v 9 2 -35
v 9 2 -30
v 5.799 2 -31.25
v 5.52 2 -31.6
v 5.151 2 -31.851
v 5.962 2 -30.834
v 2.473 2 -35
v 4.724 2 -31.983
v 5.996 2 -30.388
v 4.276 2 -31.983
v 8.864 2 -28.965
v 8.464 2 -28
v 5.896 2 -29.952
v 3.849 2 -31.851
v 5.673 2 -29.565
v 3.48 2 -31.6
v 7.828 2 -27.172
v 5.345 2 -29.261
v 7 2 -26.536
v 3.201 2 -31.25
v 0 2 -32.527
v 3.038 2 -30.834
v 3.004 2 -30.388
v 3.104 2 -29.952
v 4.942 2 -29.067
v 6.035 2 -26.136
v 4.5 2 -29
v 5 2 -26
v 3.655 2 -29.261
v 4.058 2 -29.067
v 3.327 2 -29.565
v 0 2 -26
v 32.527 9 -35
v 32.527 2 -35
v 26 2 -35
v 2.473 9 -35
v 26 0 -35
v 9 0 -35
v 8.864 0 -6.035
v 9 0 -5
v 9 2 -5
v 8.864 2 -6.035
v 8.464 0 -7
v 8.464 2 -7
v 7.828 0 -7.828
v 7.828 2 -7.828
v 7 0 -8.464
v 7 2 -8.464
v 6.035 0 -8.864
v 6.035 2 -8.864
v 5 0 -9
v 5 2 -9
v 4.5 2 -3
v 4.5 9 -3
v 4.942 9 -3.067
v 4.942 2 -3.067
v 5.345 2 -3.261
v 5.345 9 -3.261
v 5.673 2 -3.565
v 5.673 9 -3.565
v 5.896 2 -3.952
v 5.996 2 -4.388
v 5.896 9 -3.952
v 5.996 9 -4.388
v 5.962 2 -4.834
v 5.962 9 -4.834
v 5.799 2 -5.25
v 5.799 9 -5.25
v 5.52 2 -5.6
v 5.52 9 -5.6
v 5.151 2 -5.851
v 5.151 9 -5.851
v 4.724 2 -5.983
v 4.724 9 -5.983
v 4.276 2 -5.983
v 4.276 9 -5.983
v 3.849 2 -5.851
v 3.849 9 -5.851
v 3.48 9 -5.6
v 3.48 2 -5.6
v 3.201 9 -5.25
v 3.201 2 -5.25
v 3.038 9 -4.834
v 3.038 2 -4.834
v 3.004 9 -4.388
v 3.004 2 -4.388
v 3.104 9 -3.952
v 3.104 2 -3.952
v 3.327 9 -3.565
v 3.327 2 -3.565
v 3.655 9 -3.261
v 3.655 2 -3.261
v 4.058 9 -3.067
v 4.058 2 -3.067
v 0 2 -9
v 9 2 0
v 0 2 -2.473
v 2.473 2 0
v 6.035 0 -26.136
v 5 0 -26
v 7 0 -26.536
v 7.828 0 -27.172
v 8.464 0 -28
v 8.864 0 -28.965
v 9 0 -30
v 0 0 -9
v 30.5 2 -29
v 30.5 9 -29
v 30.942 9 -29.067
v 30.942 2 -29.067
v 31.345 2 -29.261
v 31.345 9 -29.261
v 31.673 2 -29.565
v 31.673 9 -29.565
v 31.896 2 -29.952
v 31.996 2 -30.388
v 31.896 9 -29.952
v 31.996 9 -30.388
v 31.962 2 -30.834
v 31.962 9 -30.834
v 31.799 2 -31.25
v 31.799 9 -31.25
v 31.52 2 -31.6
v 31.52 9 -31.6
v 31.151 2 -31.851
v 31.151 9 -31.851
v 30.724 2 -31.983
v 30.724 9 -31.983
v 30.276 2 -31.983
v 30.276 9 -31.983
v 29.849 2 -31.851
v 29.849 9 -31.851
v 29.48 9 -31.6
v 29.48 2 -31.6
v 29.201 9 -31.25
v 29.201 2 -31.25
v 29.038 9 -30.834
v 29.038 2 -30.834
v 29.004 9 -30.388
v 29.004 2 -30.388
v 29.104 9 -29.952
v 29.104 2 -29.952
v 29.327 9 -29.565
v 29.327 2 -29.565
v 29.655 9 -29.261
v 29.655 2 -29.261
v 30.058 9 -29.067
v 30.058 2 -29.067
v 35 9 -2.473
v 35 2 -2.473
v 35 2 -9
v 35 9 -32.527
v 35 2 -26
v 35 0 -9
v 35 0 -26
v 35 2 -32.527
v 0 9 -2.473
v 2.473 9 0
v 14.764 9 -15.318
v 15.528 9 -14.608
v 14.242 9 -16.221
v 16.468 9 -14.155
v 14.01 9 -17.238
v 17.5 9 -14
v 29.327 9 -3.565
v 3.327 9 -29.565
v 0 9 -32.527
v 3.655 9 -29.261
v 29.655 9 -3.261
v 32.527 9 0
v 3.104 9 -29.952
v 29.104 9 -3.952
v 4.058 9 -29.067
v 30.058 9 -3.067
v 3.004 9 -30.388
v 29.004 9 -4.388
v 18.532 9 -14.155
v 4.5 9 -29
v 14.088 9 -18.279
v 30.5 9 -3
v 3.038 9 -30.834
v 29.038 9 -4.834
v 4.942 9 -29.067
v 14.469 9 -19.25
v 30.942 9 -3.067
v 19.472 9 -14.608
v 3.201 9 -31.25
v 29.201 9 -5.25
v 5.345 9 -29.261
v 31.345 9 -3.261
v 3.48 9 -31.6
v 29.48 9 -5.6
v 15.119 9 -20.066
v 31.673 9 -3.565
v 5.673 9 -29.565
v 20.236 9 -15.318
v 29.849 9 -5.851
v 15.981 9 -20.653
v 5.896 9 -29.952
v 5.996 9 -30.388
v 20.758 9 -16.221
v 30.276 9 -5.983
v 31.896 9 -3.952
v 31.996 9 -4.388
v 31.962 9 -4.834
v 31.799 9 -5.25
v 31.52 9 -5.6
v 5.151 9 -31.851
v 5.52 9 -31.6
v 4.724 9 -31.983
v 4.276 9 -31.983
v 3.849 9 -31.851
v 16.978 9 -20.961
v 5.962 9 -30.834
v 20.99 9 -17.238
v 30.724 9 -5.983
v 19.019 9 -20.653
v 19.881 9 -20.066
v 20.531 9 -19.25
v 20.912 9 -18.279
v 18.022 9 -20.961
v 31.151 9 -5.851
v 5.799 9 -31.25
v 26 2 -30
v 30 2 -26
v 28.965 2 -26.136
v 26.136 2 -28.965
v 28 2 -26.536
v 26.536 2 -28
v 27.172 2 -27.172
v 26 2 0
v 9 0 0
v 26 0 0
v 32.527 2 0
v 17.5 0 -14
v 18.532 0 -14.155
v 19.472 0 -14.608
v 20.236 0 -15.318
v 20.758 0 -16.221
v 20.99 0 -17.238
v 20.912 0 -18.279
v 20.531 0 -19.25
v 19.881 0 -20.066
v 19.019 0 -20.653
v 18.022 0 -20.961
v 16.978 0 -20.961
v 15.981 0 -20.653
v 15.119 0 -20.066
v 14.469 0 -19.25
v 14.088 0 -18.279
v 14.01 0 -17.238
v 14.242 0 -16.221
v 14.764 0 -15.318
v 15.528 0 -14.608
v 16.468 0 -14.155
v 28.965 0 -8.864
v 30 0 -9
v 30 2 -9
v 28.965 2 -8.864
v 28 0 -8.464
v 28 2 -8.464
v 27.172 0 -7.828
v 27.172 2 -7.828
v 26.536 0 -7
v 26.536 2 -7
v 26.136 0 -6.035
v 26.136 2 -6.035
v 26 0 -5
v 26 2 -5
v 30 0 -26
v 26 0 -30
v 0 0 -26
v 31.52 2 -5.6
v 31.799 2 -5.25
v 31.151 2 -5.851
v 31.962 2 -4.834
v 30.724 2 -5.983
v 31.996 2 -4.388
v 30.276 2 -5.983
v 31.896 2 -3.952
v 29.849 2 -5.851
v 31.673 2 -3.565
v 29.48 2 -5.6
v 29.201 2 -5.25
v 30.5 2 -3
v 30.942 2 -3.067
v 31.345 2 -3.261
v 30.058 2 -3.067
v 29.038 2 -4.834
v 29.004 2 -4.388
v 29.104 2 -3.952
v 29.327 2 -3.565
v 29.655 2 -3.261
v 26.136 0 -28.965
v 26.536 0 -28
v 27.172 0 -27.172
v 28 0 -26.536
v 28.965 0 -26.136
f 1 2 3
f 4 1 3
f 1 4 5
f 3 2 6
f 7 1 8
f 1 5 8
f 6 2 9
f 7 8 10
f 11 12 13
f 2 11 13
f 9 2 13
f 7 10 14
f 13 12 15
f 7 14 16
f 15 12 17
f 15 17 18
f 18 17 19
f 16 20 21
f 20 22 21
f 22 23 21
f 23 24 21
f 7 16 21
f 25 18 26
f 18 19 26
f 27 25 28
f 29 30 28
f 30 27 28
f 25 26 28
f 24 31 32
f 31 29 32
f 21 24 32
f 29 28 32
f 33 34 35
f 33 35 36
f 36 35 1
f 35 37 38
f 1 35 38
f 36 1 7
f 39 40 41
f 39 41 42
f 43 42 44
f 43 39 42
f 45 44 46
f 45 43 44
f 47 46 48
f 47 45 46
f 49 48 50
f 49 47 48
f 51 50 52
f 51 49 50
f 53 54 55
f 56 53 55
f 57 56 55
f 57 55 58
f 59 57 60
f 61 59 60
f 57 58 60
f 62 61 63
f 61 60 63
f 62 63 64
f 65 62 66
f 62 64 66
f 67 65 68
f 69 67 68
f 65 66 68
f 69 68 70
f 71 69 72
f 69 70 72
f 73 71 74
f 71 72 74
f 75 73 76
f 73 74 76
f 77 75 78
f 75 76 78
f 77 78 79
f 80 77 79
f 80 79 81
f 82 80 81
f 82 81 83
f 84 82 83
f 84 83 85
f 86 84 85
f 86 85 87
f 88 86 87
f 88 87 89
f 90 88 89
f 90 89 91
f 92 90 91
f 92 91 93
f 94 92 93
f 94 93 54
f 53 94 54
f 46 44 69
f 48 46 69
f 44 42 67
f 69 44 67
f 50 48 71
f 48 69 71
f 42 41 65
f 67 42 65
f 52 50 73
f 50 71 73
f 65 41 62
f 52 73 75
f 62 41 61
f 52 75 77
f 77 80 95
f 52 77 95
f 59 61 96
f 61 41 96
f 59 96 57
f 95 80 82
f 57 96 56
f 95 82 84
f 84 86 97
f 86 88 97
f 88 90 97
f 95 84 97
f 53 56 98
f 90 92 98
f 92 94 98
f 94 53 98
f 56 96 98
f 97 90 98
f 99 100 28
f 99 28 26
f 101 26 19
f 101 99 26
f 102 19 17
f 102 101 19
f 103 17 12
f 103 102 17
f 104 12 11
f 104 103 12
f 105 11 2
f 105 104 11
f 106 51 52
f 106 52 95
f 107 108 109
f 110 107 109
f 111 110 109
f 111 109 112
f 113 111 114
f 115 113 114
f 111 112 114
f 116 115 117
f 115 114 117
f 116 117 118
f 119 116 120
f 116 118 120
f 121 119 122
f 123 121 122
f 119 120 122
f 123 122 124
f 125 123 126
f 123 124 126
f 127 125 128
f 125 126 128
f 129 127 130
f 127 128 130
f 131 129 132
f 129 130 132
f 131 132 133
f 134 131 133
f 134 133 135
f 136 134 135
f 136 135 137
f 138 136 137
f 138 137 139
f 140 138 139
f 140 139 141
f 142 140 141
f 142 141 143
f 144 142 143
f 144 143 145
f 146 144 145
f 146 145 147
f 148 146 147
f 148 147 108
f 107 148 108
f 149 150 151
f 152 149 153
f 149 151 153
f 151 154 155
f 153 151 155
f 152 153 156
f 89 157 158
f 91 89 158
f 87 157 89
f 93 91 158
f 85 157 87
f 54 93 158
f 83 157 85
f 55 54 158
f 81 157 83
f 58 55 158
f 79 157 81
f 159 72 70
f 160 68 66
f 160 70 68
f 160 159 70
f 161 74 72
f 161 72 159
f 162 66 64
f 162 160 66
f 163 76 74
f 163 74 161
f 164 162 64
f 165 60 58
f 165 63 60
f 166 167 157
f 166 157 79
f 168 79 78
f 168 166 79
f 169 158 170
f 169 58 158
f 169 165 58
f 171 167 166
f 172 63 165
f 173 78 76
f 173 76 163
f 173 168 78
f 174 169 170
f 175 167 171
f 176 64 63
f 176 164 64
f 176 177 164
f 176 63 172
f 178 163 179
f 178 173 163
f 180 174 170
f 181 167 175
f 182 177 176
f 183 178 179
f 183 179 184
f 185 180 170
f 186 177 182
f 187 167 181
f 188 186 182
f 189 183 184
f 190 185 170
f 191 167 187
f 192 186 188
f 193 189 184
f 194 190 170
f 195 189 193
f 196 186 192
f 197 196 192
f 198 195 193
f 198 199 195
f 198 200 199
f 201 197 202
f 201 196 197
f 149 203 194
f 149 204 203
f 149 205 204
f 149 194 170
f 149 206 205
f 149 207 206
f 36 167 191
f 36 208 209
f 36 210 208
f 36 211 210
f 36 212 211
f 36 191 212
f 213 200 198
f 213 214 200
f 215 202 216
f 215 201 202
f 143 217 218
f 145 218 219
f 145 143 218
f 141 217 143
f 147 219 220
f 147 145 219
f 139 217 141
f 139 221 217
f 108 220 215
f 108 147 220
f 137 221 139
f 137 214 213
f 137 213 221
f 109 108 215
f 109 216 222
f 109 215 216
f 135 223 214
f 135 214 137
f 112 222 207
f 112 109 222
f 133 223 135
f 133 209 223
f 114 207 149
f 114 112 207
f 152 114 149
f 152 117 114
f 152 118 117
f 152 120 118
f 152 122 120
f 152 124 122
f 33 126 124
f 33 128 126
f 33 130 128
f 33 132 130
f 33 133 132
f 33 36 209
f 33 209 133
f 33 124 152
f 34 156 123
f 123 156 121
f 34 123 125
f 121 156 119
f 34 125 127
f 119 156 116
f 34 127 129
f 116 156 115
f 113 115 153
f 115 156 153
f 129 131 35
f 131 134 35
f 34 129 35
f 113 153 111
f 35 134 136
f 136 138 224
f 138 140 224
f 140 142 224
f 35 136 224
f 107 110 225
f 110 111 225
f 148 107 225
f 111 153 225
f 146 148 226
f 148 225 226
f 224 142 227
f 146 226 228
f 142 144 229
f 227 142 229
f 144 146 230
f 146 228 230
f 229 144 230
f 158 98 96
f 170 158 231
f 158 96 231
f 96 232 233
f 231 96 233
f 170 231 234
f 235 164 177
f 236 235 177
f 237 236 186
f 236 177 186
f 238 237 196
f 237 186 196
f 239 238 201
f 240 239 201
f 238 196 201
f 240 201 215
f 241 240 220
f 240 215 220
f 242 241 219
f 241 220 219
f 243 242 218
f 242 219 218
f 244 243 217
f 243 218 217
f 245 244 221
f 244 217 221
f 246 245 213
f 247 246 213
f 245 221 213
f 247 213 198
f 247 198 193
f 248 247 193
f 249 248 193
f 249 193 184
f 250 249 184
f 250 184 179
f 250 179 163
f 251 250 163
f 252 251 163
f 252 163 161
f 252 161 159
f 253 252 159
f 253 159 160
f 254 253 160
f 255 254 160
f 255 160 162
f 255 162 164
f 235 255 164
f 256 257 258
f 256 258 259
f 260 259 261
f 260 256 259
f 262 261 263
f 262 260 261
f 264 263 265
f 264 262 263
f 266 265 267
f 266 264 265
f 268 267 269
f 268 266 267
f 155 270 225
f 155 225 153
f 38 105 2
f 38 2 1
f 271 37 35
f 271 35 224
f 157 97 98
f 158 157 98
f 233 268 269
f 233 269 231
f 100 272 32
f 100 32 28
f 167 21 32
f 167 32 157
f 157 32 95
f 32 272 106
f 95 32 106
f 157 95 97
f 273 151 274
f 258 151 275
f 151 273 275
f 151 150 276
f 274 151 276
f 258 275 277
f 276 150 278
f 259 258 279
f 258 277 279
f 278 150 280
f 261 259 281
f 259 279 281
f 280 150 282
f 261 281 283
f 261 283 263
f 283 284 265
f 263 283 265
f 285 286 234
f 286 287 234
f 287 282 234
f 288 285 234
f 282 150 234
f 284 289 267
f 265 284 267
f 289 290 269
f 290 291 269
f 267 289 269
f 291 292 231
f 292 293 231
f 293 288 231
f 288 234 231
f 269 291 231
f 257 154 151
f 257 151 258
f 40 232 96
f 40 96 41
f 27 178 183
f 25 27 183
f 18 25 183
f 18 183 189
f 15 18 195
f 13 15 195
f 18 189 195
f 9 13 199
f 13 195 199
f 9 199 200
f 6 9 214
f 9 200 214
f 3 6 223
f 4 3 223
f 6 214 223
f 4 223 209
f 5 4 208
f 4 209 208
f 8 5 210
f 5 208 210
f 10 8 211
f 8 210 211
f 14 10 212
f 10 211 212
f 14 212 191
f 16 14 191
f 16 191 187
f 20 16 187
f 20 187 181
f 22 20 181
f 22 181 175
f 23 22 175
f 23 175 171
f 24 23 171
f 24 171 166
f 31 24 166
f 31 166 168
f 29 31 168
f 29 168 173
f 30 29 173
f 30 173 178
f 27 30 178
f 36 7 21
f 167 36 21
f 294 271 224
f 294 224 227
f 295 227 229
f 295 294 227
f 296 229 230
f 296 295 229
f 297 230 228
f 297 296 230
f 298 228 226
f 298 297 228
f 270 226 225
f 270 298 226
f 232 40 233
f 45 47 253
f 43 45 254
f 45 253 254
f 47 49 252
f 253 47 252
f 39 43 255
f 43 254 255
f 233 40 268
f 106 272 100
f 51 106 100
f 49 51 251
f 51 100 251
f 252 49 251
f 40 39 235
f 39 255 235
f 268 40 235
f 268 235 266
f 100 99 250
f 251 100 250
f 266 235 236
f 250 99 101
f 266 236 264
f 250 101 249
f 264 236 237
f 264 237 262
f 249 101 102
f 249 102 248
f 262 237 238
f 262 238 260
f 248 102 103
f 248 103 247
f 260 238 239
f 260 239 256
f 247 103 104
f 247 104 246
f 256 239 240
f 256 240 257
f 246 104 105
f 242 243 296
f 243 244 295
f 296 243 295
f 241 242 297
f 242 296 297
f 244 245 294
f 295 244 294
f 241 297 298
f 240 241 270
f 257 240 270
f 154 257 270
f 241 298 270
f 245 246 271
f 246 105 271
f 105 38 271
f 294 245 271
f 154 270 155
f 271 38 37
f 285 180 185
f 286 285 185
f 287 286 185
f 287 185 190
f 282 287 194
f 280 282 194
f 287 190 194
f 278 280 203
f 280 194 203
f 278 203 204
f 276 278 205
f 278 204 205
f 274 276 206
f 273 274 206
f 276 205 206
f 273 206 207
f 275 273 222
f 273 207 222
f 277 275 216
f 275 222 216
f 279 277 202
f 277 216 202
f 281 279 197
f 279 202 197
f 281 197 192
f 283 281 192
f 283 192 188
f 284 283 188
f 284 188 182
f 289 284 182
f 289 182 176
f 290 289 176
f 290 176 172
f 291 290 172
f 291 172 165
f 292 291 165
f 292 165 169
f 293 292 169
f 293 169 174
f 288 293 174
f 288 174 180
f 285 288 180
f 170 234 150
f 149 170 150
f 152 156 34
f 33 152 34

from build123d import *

# Parameters (mm, degrees)
SALIENTE_EXTRUIR1_DEPTH = 9
CROQUIS2_R              = 3.5
CORTAR_EXTRUIR1_DEPTH   = 51.309044912
CROQUIS3_R              = 1.5
CORTAR_EXTRUIR2_DEPTH   = 51.309044912
CUT_EXTRUDE1_DEPTH      = 2


with BuildPart() as part:
    # Croquis1 → Saliente-Extruir1 (new body)
    with BuildSketch(Plane(origin=(0, 0, 0), x_dir=(1, 0, 0), z_dir=(0, 1, 0))):
        Polygon((0, 2.473088065), (2.473088065, 0), (32.526911935, 0), (35, 2.473088065), (35, 32.526911935), (32.526911935, 35), (2.473088065, 35), (0, 32.526911935), align=None)
    extrude(amount=SALIENTE_EXTRUIR1_DEPTH)

    # Croquis2 → Cortar-Extruir1 (cut, through all)
    with BuildSketch(Plane(origin=(0, 9, 0), x_dir=(1, 0, 0), z_dir=(0, 1, 0))):
        with Locations(Location((17.5, 17.5, 0), (0, 0, 270))):
            Circle(CROQUIS2_R)
    extrude(amount=-CORTAR_EXTRUIR1_DEPTH, mode=Mode.SUBTRACT)

    # Croquis3 → Cortar-Extruir2 (cut, through all)
    with BuildSketch(Plane(origin=(0, 9, 0), x_dir=(1, 0, 0), z_dir=(0, 1, 0))):
        with Locations(Location((4.5, 30.5, 0), (0, 0, 270))):
            Circle(CROQUIS3_R)
        with Locations(Location((30.5, 30.5, 0), (0, 0, 270))):
            Circle(CROQUIS3_R)
        with Locations(Location((30.5, 4.5, 0), (0, 0, 270))):
            Circle(CROQUIS3_R)
        with Locations(Location((4.5, 4.5, 0), (0, 0, 270))):
            Circle(CROQUIS3_R)
    extrude(amount=-CORTAR_EXTRUIR2_DEPTH, mode=Mode.SUBTRACT)

    # Sketch1 → Cut-Extrude1 (cut)
    with BuildSketch(Plane.XZ):
        with BuildLine():
            Line((35, 0), (35, -9))
            Line((35, -9), (30, -9))
            ThreePointArc((30, -9), (27.171572875, -7.828427125), (26, -5))
            Line((26, -5), (26, 0))
            Line((26, 0), (35, 0))
        make_face()
        with BuildLine():
            Line((0, 0), (9, 0))
            Line((9, 0), (9, -5))
            ThreePointArc((9, -5), (7.828427125, -7.828427125), (5, -9))
            Line((5, -9), (0, -9))
            Line((0, -9), (0, 0))
        make_face()
        with BuildLine():
            Line((35, -35), (26, -35))
            Line((26, -35), (26, -30))
            ThreePointArc((26, -30), (27.171572875, -27.171572875), (30, -26))
            Line((30, -26), (35, -26))
            Line((35, -26), (35, -35))
        make_face()
        with BuildLine():
            Line((0, -35), (0, -26))
            Line((0, -26), (5, -26))
            ThreePointArc((5, -26), (7.828427125, -27.171572875), (9, -30))
            Line((9, -30), (9, -35))
            Line((9, -35), (0, -35))
        make_face()
    extrude(amount=-CUT_EXTRUDE1_DEPTH, mode=Mode.SUBTRACT)


solid = part.part
